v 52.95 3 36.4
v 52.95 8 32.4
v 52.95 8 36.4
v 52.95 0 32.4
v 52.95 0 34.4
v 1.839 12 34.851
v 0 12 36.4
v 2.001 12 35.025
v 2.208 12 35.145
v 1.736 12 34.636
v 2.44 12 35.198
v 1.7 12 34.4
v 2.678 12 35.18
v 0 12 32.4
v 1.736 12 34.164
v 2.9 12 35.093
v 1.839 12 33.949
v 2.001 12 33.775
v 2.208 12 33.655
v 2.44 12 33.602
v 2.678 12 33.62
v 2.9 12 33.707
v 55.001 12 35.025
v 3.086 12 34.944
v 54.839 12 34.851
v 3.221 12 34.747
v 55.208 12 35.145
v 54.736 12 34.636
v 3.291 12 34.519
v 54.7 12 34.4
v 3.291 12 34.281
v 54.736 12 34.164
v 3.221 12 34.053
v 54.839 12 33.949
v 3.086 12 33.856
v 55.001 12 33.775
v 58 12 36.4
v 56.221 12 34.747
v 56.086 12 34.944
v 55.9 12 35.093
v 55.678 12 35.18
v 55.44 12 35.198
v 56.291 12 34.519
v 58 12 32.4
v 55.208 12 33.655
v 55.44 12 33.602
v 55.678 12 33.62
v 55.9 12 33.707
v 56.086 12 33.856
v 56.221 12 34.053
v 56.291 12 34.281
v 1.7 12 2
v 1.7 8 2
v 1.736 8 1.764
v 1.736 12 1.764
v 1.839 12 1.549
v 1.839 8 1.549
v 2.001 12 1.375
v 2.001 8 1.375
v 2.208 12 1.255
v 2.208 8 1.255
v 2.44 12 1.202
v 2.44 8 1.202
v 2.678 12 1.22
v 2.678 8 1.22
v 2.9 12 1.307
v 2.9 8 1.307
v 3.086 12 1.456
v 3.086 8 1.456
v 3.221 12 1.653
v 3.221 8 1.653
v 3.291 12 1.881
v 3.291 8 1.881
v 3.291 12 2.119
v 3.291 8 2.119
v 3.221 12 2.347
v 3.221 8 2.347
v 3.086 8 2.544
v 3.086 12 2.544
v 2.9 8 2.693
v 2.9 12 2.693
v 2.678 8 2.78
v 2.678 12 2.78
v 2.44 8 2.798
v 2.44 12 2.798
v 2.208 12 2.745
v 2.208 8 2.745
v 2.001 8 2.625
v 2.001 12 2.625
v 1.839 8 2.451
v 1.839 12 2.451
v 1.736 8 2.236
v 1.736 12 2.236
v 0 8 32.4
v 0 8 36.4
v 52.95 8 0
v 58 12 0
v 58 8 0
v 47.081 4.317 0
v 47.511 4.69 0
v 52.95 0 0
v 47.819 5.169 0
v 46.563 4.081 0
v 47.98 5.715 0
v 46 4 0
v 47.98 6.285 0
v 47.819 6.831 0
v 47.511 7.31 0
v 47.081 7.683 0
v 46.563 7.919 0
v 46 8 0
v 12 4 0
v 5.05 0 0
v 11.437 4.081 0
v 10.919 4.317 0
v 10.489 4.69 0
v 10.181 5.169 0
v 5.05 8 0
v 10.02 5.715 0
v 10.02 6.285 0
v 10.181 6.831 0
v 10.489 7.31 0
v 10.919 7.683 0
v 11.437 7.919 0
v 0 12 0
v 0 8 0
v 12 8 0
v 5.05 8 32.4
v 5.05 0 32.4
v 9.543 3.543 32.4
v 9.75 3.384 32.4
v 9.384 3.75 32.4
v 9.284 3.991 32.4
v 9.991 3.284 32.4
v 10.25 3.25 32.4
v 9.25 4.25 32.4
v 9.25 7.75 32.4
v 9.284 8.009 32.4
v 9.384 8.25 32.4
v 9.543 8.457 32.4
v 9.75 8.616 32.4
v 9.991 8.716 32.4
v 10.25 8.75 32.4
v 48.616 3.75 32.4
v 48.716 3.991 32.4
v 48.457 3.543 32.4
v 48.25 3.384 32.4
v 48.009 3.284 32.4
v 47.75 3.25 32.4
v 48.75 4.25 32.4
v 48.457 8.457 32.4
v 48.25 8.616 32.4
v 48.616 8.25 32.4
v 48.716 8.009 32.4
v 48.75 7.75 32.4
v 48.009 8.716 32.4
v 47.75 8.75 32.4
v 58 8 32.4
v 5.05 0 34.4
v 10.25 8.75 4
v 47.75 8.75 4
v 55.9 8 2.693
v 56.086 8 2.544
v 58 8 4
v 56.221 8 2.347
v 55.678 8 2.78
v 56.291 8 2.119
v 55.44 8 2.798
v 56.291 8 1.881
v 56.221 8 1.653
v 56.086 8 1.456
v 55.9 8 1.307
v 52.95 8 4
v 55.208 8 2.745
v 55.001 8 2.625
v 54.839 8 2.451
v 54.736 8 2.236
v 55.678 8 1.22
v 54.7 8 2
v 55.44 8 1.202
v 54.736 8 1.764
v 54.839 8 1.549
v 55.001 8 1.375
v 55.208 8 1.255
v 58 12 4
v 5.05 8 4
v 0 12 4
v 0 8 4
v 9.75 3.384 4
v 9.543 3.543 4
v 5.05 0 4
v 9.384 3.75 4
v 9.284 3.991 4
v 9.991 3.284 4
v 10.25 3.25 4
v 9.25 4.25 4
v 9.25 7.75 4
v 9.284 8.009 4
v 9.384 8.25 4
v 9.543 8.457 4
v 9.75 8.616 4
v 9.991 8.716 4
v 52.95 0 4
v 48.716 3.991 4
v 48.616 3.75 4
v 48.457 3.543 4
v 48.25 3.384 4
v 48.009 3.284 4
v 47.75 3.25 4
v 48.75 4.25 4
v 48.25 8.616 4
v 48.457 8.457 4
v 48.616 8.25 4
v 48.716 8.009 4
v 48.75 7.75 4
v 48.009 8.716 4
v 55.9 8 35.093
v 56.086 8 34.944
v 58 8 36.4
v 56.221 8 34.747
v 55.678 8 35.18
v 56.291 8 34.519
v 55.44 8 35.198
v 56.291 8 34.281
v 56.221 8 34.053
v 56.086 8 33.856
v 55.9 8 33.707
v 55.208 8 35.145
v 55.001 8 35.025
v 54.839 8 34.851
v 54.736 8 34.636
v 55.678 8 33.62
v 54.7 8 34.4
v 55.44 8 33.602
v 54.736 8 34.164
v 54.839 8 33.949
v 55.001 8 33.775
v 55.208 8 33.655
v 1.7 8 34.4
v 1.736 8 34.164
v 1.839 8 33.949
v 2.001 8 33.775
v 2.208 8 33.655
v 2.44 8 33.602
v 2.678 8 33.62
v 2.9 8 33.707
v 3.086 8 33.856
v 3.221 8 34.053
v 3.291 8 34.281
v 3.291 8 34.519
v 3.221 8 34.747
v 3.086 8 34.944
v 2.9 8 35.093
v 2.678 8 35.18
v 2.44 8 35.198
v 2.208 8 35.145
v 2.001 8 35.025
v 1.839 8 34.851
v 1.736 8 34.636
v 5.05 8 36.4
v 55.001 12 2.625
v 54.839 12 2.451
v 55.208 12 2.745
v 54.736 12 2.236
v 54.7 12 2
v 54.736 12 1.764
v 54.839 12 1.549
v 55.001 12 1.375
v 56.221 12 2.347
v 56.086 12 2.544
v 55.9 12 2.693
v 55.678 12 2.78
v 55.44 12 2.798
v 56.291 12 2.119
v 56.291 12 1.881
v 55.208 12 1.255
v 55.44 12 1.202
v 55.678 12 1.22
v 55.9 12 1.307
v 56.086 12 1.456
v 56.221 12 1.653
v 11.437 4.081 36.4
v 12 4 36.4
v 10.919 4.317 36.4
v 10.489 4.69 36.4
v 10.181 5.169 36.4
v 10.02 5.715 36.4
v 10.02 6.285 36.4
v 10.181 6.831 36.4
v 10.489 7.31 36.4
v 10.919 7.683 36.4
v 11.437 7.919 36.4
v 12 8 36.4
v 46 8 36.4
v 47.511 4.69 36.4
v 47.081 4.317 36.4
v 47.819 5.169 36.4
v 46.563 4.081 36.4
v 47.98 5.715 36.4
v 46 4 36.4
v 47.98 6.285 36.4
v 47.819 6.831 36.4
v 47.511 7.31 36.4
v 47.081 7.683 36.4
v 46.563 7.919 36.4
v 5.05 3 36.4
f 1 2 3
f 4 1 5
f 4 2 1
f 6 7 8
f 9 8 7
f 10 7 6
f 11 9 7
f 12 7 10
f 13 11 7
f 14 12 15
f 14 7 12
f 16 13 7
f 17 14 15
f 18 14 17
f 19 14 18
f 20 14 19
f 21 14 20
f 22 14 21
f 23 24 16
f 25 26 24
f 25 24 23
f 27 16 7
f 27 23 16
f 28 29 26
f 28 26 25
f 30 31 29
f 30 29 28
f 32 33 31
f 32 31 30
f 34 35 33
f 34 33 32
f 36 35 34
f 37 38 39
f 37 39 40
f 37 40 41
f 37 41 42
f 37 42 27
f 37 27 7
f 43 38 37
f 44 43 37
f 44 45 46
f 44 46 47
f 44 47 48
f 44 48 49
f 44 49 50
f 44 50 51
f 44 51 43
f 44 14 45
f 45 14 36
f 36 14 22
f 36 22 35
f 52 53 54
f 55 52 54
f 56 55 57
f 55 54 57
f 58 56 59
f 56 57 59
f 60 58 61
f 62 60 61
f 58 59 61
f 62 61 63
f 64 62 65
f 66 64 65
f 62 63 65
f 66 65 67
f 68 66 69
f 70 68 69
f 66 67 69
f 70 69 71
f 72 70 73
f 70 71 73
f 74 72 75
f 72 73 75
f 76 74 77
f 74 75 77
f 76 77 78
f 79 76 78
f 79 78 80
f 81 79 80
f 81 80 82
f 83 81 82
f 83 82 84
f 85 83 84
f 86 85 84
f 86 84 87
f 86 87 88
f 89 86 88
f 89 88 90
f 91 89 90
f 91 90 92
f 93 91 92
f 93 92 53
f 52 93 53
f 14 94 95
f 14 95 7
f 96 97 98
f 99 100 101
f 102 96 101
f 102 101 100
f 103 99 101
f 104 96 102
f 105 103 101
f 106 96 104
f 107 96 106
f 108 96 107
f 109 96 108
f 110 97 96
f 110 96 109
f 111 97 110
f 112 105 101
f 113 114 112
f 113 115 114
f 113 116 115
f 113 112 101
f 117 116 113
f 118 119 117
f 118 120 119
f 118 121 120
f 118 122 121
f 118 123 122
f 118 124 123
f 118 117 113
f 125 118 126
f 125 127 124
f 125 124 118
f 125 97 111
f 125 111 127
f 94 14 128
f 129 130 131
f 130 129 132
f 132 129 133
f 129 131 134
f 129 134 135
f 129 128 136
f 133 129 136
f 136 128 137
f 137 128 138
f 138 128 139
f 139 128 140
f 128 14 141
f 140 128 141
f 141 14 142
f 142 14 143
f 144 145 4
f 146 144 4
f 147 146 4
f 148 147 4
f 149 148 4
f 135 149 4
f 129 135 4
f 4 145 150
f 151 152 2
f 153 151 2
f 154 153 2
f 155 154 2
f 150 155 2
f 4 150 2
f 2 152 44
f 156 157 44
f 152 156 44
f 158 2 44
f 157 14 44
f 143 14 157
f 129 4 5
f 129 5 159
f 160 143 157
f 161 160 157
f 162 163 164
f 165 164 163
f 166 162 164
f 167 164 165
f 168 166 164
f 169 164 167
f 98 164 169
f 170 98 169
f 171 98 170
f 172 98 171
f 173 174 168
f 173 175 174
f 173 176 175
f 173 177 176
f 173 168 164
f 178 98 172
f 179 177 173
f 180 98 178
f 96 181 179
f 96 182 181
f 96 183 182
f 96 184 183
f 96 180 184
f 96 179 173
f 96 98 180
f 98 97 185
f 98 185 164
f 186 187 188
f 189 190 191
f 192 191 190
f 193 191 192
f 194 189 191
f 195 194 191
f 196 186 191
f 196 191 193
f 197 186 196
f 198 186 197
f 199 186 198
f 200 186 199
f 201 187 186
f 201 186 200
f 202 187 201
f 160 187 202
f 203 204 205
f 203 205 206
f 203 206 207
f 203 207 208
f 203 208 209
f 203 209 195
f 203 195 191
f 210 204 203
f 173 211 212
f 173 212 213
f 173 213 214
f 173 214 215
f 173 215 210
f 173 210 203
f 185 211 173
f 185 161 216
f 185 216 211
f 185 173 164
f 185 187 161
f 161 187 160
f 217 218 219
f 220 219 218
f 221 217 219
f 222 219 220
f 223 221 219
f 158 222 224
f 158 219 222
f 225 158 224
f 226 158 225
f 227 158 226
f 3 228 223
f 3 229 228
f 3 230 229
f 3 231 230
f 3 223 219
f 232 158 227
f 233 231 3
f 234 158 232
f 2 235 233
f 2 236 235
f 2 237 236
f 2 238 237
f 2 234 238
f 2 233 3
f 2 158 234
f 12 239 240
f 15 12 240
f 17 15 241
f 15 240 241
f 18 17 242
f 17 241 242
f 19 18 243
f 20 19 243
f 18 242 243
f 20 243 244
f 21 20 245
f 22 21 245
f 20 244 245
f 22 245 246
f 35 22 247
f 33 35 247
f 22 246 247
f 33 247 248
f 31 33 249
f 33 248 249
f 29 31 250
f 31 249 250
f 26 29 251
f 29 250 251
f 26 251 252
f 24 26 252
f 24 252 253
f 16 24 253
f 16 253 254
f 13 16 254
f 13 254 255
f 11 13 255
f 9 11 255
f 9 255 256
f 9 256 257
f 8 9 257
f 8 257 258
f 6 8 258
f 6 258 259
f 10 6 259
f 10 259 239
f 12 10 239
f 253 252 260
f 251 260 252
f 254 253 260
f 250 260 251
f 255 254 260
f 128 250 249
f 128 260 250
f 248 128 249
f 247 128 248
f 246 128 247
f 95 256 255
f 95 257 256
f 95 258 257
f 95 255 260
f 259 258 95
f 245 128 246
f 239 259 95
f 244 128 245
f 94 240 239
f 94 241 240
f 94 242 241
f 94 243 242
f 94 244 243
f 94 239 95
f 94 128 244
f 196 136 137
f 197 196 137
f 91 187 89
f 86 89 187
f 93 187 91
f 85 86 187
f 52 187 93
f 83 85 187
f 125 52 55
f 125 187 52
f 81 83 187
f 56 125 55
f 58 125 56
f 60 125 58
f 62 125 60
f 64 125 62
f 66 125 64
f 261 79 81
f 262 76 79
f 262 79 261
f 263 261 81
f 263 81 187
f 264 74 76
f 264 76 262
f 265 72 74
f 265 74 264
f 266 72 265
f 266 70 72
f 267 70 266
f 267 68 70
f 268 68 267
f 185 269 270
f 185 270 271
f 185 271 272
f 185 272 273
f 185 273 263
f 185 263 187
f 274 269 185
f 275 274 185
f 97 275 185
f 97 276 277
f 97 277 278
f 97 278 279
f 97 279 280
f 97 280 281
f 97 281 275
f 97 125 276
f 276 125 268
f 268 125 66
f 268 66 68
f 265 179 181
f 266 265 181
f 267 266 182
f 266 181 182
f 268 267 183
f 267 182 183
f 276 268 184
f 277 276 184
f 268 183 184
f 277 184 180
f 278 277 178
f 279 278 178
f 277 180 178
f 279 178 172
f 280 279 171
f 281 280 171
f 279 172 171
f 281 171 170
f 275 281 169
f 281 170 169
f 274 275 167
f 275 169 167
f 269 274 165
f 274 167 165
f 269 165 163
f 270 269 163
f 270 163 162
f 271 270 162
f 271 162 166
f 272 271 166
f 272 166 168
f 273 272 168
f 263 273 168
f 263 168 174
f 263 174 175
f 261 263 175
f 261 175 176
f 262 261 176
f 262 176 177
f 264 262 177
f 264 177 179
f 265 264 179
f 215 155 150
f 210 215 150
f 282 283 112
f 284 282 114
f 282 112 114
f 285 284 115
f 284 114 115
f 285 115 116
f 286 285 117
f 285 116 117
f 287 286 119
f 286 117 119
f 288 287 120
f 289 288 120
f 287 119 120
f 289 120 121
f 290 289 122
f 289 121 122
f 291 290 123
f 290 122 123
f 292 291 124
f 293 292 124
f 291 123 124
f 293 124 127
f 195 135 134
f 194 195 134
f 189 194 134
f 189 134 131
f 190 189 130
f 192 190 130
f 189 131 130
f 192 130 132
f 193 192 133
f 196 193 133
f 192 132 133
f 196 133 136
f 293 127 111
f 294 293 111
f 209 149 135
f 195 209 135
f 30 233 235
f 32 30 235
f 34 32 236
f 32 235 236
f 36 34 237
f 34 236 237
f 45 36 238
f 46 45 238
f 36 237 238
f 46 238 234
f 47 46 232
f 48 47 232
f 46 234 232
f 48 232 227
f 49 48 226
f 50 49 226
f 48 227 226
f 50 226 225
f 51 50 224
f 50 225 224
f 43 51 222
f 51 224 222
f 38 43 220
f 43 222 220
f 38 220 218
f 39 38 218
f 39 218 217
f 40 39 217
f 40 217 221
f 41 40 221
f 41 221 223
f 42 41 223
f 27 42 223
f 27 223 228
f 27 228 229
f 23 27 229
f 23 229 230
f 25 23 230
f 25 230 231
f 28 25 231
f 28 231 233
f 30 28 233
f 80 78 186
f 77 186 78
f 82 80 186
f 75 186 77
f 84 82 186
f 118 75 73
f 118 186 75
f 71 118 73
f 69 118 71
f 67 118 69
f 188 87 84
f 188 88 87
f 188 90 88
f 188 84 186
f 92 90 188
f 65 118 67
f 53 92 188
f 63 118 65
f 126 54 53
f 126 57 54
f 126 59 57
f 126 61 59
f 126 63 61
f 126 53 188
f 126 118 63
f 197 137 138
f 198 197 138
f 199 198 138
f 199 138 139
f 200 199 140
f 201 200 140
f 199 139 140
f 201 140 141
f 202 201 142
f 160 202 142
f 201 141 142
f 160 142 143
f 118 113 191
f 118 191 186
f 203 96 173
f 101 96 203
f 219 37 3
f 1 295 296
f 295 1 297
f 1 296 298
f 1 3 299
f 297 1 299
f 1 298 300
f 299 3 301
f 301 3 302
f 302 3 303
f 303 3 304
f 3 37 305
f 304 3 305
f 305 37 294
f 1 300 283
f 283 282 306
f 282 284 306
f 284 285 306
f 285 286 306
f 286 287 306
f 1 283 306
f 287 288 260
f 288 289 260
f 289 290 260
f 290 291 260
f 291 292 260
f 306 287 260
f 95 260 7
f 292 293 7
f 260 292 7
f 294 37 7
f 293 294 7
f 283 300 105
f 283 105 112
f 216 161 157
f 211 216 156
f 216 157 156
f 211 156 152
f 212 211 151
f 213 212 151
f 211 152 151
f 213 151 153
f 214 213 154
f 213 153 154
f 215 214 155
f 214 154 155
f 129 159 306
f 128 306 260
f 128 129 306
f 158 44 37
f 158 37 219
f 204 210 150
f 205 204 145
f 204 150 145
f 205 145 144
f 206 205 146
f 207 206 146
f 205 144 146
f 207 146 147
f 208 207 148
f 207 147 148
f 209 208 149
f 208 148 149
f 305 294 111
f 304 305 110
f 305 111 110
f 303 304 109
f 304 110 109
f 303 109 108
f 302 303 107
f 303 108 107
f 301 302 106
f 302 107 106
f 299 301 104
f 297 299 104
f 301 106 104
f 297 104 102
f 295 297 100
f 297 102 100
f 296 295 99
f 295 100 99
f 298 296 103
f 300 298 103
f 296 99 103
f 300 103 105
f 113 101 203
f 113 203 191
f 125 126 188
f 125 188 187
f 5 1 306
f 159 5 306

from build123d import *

# Parameters (mm, degrees)
BOSS_EXTRUDE1_DEPTH             = 36.4
CUT_EXTRUDE1_START              = -4
SKETCH2_OUTSIDE_W               = 73.904
SKETCH2_OUTSIDE_H               = 27.904
CUT_EXTRUDE1_DEPTH              = 28.4
CHAMFER1_SIZE                   = 2
CHAMFER1_SIZE2                  = 3
TAP_DRILL_FOR_M2X0_4_TAP1_D     = 1.6
TAP_DRILL_FOR_M2X0_4_TAP1_DEPTH = 4


with BuildPart() as part:
    # Sketch1 → Boss-Extrude1 (new body)
    with BuildSketch(Plane.XY):
        Polygon((0, 12), (58, 12), (58, 8), (52.95, 8), (52.95, 0), (5.05, 0), (5.05, 8), (0, 8), align=None)
        with BuildLine():
            Line((12, 8), (46, 8))
            ThreePointArc((46, 8), (48, 6), (46, 4))
            Line((46, 4), (12, 4))
            ThreePointArc((12, 4), (10, 6), (12, 8))
        make_face(mode=Mode.SUBTRACT)
    extrude(amount=BOSS_EXTRUDE1_DEPTH)

    # Sketch2 outside → Cut-Extrude1 (cut)
    with BuildSketch(Plane.XY.offset(36.4).offset(CUT_EXTRUDE1_START)):
        with Locations((29, 6)):
            Rectangle(SKETCH2_OUTSIDE_W, SKETCH2_OUTSIDE_H)
        with BuildLine():
            Line((10.25, 8.75), (47.75, 8.75))
            ThreePointArc((47.75, 8.75), (48.457106781, 8.457106781), (48.75, 7.75))
            Line((48.75, 7.75), (48.75, 4.25))
            ThreePointArc((48.75, 4.25), (48.457106781, 3.542893219), (47.75, 3.25))
            Line((47.75, 3.25), (10.25, 3.25))
            ThreePointArc((10.25, 3.25), (9.542893219, 3.542893219), (9.25, 4.25))
            Line((9.25, 4.25), (9.25, 7.75))
            ThreePointArc((9.25, 7.75), (9.542893219, 8.457106781), (10.25, 8.75))
        make_face(mode=Mode.SUBTRACT)
    extrude(amount=-CUT_EXTRUDE1_DEPTH, mode=Mode.SUBTRACT)

    # Chamfer1
    chamfer1_edges = [part.edges().sort_by_distance(p)[0] for p in [
        (29, 0, 36.4),
    ]]
    chamfer1_side = [part.faces().sort_by_distance(p)[0] for p in [
        (29, 0, 34.4),
    ]]
    chamfer(chamfer1_edges, length=CHAMFER1_SIZE, length2=CHAMFER1_SIZE2, reference=chamfer1_side[0])

    # Tap Drill for M2x0.4 Tap1
    with Locations(Plane(origin=(0, 12, 0), x_dir=(1, 0, 0), z_dir=(0, 1, 0))):
        with Locations((2.5, -2), (55.5, -2), (55.5, -34.4), (2.5, -34.4)):
            Hole(TAP_DRILL_FOR_M2X0_4_TAP1_D / 2, depth=TAP_DRILL_FOR_M2X0_4_TAP1_DEPTH)


solid = part.part
